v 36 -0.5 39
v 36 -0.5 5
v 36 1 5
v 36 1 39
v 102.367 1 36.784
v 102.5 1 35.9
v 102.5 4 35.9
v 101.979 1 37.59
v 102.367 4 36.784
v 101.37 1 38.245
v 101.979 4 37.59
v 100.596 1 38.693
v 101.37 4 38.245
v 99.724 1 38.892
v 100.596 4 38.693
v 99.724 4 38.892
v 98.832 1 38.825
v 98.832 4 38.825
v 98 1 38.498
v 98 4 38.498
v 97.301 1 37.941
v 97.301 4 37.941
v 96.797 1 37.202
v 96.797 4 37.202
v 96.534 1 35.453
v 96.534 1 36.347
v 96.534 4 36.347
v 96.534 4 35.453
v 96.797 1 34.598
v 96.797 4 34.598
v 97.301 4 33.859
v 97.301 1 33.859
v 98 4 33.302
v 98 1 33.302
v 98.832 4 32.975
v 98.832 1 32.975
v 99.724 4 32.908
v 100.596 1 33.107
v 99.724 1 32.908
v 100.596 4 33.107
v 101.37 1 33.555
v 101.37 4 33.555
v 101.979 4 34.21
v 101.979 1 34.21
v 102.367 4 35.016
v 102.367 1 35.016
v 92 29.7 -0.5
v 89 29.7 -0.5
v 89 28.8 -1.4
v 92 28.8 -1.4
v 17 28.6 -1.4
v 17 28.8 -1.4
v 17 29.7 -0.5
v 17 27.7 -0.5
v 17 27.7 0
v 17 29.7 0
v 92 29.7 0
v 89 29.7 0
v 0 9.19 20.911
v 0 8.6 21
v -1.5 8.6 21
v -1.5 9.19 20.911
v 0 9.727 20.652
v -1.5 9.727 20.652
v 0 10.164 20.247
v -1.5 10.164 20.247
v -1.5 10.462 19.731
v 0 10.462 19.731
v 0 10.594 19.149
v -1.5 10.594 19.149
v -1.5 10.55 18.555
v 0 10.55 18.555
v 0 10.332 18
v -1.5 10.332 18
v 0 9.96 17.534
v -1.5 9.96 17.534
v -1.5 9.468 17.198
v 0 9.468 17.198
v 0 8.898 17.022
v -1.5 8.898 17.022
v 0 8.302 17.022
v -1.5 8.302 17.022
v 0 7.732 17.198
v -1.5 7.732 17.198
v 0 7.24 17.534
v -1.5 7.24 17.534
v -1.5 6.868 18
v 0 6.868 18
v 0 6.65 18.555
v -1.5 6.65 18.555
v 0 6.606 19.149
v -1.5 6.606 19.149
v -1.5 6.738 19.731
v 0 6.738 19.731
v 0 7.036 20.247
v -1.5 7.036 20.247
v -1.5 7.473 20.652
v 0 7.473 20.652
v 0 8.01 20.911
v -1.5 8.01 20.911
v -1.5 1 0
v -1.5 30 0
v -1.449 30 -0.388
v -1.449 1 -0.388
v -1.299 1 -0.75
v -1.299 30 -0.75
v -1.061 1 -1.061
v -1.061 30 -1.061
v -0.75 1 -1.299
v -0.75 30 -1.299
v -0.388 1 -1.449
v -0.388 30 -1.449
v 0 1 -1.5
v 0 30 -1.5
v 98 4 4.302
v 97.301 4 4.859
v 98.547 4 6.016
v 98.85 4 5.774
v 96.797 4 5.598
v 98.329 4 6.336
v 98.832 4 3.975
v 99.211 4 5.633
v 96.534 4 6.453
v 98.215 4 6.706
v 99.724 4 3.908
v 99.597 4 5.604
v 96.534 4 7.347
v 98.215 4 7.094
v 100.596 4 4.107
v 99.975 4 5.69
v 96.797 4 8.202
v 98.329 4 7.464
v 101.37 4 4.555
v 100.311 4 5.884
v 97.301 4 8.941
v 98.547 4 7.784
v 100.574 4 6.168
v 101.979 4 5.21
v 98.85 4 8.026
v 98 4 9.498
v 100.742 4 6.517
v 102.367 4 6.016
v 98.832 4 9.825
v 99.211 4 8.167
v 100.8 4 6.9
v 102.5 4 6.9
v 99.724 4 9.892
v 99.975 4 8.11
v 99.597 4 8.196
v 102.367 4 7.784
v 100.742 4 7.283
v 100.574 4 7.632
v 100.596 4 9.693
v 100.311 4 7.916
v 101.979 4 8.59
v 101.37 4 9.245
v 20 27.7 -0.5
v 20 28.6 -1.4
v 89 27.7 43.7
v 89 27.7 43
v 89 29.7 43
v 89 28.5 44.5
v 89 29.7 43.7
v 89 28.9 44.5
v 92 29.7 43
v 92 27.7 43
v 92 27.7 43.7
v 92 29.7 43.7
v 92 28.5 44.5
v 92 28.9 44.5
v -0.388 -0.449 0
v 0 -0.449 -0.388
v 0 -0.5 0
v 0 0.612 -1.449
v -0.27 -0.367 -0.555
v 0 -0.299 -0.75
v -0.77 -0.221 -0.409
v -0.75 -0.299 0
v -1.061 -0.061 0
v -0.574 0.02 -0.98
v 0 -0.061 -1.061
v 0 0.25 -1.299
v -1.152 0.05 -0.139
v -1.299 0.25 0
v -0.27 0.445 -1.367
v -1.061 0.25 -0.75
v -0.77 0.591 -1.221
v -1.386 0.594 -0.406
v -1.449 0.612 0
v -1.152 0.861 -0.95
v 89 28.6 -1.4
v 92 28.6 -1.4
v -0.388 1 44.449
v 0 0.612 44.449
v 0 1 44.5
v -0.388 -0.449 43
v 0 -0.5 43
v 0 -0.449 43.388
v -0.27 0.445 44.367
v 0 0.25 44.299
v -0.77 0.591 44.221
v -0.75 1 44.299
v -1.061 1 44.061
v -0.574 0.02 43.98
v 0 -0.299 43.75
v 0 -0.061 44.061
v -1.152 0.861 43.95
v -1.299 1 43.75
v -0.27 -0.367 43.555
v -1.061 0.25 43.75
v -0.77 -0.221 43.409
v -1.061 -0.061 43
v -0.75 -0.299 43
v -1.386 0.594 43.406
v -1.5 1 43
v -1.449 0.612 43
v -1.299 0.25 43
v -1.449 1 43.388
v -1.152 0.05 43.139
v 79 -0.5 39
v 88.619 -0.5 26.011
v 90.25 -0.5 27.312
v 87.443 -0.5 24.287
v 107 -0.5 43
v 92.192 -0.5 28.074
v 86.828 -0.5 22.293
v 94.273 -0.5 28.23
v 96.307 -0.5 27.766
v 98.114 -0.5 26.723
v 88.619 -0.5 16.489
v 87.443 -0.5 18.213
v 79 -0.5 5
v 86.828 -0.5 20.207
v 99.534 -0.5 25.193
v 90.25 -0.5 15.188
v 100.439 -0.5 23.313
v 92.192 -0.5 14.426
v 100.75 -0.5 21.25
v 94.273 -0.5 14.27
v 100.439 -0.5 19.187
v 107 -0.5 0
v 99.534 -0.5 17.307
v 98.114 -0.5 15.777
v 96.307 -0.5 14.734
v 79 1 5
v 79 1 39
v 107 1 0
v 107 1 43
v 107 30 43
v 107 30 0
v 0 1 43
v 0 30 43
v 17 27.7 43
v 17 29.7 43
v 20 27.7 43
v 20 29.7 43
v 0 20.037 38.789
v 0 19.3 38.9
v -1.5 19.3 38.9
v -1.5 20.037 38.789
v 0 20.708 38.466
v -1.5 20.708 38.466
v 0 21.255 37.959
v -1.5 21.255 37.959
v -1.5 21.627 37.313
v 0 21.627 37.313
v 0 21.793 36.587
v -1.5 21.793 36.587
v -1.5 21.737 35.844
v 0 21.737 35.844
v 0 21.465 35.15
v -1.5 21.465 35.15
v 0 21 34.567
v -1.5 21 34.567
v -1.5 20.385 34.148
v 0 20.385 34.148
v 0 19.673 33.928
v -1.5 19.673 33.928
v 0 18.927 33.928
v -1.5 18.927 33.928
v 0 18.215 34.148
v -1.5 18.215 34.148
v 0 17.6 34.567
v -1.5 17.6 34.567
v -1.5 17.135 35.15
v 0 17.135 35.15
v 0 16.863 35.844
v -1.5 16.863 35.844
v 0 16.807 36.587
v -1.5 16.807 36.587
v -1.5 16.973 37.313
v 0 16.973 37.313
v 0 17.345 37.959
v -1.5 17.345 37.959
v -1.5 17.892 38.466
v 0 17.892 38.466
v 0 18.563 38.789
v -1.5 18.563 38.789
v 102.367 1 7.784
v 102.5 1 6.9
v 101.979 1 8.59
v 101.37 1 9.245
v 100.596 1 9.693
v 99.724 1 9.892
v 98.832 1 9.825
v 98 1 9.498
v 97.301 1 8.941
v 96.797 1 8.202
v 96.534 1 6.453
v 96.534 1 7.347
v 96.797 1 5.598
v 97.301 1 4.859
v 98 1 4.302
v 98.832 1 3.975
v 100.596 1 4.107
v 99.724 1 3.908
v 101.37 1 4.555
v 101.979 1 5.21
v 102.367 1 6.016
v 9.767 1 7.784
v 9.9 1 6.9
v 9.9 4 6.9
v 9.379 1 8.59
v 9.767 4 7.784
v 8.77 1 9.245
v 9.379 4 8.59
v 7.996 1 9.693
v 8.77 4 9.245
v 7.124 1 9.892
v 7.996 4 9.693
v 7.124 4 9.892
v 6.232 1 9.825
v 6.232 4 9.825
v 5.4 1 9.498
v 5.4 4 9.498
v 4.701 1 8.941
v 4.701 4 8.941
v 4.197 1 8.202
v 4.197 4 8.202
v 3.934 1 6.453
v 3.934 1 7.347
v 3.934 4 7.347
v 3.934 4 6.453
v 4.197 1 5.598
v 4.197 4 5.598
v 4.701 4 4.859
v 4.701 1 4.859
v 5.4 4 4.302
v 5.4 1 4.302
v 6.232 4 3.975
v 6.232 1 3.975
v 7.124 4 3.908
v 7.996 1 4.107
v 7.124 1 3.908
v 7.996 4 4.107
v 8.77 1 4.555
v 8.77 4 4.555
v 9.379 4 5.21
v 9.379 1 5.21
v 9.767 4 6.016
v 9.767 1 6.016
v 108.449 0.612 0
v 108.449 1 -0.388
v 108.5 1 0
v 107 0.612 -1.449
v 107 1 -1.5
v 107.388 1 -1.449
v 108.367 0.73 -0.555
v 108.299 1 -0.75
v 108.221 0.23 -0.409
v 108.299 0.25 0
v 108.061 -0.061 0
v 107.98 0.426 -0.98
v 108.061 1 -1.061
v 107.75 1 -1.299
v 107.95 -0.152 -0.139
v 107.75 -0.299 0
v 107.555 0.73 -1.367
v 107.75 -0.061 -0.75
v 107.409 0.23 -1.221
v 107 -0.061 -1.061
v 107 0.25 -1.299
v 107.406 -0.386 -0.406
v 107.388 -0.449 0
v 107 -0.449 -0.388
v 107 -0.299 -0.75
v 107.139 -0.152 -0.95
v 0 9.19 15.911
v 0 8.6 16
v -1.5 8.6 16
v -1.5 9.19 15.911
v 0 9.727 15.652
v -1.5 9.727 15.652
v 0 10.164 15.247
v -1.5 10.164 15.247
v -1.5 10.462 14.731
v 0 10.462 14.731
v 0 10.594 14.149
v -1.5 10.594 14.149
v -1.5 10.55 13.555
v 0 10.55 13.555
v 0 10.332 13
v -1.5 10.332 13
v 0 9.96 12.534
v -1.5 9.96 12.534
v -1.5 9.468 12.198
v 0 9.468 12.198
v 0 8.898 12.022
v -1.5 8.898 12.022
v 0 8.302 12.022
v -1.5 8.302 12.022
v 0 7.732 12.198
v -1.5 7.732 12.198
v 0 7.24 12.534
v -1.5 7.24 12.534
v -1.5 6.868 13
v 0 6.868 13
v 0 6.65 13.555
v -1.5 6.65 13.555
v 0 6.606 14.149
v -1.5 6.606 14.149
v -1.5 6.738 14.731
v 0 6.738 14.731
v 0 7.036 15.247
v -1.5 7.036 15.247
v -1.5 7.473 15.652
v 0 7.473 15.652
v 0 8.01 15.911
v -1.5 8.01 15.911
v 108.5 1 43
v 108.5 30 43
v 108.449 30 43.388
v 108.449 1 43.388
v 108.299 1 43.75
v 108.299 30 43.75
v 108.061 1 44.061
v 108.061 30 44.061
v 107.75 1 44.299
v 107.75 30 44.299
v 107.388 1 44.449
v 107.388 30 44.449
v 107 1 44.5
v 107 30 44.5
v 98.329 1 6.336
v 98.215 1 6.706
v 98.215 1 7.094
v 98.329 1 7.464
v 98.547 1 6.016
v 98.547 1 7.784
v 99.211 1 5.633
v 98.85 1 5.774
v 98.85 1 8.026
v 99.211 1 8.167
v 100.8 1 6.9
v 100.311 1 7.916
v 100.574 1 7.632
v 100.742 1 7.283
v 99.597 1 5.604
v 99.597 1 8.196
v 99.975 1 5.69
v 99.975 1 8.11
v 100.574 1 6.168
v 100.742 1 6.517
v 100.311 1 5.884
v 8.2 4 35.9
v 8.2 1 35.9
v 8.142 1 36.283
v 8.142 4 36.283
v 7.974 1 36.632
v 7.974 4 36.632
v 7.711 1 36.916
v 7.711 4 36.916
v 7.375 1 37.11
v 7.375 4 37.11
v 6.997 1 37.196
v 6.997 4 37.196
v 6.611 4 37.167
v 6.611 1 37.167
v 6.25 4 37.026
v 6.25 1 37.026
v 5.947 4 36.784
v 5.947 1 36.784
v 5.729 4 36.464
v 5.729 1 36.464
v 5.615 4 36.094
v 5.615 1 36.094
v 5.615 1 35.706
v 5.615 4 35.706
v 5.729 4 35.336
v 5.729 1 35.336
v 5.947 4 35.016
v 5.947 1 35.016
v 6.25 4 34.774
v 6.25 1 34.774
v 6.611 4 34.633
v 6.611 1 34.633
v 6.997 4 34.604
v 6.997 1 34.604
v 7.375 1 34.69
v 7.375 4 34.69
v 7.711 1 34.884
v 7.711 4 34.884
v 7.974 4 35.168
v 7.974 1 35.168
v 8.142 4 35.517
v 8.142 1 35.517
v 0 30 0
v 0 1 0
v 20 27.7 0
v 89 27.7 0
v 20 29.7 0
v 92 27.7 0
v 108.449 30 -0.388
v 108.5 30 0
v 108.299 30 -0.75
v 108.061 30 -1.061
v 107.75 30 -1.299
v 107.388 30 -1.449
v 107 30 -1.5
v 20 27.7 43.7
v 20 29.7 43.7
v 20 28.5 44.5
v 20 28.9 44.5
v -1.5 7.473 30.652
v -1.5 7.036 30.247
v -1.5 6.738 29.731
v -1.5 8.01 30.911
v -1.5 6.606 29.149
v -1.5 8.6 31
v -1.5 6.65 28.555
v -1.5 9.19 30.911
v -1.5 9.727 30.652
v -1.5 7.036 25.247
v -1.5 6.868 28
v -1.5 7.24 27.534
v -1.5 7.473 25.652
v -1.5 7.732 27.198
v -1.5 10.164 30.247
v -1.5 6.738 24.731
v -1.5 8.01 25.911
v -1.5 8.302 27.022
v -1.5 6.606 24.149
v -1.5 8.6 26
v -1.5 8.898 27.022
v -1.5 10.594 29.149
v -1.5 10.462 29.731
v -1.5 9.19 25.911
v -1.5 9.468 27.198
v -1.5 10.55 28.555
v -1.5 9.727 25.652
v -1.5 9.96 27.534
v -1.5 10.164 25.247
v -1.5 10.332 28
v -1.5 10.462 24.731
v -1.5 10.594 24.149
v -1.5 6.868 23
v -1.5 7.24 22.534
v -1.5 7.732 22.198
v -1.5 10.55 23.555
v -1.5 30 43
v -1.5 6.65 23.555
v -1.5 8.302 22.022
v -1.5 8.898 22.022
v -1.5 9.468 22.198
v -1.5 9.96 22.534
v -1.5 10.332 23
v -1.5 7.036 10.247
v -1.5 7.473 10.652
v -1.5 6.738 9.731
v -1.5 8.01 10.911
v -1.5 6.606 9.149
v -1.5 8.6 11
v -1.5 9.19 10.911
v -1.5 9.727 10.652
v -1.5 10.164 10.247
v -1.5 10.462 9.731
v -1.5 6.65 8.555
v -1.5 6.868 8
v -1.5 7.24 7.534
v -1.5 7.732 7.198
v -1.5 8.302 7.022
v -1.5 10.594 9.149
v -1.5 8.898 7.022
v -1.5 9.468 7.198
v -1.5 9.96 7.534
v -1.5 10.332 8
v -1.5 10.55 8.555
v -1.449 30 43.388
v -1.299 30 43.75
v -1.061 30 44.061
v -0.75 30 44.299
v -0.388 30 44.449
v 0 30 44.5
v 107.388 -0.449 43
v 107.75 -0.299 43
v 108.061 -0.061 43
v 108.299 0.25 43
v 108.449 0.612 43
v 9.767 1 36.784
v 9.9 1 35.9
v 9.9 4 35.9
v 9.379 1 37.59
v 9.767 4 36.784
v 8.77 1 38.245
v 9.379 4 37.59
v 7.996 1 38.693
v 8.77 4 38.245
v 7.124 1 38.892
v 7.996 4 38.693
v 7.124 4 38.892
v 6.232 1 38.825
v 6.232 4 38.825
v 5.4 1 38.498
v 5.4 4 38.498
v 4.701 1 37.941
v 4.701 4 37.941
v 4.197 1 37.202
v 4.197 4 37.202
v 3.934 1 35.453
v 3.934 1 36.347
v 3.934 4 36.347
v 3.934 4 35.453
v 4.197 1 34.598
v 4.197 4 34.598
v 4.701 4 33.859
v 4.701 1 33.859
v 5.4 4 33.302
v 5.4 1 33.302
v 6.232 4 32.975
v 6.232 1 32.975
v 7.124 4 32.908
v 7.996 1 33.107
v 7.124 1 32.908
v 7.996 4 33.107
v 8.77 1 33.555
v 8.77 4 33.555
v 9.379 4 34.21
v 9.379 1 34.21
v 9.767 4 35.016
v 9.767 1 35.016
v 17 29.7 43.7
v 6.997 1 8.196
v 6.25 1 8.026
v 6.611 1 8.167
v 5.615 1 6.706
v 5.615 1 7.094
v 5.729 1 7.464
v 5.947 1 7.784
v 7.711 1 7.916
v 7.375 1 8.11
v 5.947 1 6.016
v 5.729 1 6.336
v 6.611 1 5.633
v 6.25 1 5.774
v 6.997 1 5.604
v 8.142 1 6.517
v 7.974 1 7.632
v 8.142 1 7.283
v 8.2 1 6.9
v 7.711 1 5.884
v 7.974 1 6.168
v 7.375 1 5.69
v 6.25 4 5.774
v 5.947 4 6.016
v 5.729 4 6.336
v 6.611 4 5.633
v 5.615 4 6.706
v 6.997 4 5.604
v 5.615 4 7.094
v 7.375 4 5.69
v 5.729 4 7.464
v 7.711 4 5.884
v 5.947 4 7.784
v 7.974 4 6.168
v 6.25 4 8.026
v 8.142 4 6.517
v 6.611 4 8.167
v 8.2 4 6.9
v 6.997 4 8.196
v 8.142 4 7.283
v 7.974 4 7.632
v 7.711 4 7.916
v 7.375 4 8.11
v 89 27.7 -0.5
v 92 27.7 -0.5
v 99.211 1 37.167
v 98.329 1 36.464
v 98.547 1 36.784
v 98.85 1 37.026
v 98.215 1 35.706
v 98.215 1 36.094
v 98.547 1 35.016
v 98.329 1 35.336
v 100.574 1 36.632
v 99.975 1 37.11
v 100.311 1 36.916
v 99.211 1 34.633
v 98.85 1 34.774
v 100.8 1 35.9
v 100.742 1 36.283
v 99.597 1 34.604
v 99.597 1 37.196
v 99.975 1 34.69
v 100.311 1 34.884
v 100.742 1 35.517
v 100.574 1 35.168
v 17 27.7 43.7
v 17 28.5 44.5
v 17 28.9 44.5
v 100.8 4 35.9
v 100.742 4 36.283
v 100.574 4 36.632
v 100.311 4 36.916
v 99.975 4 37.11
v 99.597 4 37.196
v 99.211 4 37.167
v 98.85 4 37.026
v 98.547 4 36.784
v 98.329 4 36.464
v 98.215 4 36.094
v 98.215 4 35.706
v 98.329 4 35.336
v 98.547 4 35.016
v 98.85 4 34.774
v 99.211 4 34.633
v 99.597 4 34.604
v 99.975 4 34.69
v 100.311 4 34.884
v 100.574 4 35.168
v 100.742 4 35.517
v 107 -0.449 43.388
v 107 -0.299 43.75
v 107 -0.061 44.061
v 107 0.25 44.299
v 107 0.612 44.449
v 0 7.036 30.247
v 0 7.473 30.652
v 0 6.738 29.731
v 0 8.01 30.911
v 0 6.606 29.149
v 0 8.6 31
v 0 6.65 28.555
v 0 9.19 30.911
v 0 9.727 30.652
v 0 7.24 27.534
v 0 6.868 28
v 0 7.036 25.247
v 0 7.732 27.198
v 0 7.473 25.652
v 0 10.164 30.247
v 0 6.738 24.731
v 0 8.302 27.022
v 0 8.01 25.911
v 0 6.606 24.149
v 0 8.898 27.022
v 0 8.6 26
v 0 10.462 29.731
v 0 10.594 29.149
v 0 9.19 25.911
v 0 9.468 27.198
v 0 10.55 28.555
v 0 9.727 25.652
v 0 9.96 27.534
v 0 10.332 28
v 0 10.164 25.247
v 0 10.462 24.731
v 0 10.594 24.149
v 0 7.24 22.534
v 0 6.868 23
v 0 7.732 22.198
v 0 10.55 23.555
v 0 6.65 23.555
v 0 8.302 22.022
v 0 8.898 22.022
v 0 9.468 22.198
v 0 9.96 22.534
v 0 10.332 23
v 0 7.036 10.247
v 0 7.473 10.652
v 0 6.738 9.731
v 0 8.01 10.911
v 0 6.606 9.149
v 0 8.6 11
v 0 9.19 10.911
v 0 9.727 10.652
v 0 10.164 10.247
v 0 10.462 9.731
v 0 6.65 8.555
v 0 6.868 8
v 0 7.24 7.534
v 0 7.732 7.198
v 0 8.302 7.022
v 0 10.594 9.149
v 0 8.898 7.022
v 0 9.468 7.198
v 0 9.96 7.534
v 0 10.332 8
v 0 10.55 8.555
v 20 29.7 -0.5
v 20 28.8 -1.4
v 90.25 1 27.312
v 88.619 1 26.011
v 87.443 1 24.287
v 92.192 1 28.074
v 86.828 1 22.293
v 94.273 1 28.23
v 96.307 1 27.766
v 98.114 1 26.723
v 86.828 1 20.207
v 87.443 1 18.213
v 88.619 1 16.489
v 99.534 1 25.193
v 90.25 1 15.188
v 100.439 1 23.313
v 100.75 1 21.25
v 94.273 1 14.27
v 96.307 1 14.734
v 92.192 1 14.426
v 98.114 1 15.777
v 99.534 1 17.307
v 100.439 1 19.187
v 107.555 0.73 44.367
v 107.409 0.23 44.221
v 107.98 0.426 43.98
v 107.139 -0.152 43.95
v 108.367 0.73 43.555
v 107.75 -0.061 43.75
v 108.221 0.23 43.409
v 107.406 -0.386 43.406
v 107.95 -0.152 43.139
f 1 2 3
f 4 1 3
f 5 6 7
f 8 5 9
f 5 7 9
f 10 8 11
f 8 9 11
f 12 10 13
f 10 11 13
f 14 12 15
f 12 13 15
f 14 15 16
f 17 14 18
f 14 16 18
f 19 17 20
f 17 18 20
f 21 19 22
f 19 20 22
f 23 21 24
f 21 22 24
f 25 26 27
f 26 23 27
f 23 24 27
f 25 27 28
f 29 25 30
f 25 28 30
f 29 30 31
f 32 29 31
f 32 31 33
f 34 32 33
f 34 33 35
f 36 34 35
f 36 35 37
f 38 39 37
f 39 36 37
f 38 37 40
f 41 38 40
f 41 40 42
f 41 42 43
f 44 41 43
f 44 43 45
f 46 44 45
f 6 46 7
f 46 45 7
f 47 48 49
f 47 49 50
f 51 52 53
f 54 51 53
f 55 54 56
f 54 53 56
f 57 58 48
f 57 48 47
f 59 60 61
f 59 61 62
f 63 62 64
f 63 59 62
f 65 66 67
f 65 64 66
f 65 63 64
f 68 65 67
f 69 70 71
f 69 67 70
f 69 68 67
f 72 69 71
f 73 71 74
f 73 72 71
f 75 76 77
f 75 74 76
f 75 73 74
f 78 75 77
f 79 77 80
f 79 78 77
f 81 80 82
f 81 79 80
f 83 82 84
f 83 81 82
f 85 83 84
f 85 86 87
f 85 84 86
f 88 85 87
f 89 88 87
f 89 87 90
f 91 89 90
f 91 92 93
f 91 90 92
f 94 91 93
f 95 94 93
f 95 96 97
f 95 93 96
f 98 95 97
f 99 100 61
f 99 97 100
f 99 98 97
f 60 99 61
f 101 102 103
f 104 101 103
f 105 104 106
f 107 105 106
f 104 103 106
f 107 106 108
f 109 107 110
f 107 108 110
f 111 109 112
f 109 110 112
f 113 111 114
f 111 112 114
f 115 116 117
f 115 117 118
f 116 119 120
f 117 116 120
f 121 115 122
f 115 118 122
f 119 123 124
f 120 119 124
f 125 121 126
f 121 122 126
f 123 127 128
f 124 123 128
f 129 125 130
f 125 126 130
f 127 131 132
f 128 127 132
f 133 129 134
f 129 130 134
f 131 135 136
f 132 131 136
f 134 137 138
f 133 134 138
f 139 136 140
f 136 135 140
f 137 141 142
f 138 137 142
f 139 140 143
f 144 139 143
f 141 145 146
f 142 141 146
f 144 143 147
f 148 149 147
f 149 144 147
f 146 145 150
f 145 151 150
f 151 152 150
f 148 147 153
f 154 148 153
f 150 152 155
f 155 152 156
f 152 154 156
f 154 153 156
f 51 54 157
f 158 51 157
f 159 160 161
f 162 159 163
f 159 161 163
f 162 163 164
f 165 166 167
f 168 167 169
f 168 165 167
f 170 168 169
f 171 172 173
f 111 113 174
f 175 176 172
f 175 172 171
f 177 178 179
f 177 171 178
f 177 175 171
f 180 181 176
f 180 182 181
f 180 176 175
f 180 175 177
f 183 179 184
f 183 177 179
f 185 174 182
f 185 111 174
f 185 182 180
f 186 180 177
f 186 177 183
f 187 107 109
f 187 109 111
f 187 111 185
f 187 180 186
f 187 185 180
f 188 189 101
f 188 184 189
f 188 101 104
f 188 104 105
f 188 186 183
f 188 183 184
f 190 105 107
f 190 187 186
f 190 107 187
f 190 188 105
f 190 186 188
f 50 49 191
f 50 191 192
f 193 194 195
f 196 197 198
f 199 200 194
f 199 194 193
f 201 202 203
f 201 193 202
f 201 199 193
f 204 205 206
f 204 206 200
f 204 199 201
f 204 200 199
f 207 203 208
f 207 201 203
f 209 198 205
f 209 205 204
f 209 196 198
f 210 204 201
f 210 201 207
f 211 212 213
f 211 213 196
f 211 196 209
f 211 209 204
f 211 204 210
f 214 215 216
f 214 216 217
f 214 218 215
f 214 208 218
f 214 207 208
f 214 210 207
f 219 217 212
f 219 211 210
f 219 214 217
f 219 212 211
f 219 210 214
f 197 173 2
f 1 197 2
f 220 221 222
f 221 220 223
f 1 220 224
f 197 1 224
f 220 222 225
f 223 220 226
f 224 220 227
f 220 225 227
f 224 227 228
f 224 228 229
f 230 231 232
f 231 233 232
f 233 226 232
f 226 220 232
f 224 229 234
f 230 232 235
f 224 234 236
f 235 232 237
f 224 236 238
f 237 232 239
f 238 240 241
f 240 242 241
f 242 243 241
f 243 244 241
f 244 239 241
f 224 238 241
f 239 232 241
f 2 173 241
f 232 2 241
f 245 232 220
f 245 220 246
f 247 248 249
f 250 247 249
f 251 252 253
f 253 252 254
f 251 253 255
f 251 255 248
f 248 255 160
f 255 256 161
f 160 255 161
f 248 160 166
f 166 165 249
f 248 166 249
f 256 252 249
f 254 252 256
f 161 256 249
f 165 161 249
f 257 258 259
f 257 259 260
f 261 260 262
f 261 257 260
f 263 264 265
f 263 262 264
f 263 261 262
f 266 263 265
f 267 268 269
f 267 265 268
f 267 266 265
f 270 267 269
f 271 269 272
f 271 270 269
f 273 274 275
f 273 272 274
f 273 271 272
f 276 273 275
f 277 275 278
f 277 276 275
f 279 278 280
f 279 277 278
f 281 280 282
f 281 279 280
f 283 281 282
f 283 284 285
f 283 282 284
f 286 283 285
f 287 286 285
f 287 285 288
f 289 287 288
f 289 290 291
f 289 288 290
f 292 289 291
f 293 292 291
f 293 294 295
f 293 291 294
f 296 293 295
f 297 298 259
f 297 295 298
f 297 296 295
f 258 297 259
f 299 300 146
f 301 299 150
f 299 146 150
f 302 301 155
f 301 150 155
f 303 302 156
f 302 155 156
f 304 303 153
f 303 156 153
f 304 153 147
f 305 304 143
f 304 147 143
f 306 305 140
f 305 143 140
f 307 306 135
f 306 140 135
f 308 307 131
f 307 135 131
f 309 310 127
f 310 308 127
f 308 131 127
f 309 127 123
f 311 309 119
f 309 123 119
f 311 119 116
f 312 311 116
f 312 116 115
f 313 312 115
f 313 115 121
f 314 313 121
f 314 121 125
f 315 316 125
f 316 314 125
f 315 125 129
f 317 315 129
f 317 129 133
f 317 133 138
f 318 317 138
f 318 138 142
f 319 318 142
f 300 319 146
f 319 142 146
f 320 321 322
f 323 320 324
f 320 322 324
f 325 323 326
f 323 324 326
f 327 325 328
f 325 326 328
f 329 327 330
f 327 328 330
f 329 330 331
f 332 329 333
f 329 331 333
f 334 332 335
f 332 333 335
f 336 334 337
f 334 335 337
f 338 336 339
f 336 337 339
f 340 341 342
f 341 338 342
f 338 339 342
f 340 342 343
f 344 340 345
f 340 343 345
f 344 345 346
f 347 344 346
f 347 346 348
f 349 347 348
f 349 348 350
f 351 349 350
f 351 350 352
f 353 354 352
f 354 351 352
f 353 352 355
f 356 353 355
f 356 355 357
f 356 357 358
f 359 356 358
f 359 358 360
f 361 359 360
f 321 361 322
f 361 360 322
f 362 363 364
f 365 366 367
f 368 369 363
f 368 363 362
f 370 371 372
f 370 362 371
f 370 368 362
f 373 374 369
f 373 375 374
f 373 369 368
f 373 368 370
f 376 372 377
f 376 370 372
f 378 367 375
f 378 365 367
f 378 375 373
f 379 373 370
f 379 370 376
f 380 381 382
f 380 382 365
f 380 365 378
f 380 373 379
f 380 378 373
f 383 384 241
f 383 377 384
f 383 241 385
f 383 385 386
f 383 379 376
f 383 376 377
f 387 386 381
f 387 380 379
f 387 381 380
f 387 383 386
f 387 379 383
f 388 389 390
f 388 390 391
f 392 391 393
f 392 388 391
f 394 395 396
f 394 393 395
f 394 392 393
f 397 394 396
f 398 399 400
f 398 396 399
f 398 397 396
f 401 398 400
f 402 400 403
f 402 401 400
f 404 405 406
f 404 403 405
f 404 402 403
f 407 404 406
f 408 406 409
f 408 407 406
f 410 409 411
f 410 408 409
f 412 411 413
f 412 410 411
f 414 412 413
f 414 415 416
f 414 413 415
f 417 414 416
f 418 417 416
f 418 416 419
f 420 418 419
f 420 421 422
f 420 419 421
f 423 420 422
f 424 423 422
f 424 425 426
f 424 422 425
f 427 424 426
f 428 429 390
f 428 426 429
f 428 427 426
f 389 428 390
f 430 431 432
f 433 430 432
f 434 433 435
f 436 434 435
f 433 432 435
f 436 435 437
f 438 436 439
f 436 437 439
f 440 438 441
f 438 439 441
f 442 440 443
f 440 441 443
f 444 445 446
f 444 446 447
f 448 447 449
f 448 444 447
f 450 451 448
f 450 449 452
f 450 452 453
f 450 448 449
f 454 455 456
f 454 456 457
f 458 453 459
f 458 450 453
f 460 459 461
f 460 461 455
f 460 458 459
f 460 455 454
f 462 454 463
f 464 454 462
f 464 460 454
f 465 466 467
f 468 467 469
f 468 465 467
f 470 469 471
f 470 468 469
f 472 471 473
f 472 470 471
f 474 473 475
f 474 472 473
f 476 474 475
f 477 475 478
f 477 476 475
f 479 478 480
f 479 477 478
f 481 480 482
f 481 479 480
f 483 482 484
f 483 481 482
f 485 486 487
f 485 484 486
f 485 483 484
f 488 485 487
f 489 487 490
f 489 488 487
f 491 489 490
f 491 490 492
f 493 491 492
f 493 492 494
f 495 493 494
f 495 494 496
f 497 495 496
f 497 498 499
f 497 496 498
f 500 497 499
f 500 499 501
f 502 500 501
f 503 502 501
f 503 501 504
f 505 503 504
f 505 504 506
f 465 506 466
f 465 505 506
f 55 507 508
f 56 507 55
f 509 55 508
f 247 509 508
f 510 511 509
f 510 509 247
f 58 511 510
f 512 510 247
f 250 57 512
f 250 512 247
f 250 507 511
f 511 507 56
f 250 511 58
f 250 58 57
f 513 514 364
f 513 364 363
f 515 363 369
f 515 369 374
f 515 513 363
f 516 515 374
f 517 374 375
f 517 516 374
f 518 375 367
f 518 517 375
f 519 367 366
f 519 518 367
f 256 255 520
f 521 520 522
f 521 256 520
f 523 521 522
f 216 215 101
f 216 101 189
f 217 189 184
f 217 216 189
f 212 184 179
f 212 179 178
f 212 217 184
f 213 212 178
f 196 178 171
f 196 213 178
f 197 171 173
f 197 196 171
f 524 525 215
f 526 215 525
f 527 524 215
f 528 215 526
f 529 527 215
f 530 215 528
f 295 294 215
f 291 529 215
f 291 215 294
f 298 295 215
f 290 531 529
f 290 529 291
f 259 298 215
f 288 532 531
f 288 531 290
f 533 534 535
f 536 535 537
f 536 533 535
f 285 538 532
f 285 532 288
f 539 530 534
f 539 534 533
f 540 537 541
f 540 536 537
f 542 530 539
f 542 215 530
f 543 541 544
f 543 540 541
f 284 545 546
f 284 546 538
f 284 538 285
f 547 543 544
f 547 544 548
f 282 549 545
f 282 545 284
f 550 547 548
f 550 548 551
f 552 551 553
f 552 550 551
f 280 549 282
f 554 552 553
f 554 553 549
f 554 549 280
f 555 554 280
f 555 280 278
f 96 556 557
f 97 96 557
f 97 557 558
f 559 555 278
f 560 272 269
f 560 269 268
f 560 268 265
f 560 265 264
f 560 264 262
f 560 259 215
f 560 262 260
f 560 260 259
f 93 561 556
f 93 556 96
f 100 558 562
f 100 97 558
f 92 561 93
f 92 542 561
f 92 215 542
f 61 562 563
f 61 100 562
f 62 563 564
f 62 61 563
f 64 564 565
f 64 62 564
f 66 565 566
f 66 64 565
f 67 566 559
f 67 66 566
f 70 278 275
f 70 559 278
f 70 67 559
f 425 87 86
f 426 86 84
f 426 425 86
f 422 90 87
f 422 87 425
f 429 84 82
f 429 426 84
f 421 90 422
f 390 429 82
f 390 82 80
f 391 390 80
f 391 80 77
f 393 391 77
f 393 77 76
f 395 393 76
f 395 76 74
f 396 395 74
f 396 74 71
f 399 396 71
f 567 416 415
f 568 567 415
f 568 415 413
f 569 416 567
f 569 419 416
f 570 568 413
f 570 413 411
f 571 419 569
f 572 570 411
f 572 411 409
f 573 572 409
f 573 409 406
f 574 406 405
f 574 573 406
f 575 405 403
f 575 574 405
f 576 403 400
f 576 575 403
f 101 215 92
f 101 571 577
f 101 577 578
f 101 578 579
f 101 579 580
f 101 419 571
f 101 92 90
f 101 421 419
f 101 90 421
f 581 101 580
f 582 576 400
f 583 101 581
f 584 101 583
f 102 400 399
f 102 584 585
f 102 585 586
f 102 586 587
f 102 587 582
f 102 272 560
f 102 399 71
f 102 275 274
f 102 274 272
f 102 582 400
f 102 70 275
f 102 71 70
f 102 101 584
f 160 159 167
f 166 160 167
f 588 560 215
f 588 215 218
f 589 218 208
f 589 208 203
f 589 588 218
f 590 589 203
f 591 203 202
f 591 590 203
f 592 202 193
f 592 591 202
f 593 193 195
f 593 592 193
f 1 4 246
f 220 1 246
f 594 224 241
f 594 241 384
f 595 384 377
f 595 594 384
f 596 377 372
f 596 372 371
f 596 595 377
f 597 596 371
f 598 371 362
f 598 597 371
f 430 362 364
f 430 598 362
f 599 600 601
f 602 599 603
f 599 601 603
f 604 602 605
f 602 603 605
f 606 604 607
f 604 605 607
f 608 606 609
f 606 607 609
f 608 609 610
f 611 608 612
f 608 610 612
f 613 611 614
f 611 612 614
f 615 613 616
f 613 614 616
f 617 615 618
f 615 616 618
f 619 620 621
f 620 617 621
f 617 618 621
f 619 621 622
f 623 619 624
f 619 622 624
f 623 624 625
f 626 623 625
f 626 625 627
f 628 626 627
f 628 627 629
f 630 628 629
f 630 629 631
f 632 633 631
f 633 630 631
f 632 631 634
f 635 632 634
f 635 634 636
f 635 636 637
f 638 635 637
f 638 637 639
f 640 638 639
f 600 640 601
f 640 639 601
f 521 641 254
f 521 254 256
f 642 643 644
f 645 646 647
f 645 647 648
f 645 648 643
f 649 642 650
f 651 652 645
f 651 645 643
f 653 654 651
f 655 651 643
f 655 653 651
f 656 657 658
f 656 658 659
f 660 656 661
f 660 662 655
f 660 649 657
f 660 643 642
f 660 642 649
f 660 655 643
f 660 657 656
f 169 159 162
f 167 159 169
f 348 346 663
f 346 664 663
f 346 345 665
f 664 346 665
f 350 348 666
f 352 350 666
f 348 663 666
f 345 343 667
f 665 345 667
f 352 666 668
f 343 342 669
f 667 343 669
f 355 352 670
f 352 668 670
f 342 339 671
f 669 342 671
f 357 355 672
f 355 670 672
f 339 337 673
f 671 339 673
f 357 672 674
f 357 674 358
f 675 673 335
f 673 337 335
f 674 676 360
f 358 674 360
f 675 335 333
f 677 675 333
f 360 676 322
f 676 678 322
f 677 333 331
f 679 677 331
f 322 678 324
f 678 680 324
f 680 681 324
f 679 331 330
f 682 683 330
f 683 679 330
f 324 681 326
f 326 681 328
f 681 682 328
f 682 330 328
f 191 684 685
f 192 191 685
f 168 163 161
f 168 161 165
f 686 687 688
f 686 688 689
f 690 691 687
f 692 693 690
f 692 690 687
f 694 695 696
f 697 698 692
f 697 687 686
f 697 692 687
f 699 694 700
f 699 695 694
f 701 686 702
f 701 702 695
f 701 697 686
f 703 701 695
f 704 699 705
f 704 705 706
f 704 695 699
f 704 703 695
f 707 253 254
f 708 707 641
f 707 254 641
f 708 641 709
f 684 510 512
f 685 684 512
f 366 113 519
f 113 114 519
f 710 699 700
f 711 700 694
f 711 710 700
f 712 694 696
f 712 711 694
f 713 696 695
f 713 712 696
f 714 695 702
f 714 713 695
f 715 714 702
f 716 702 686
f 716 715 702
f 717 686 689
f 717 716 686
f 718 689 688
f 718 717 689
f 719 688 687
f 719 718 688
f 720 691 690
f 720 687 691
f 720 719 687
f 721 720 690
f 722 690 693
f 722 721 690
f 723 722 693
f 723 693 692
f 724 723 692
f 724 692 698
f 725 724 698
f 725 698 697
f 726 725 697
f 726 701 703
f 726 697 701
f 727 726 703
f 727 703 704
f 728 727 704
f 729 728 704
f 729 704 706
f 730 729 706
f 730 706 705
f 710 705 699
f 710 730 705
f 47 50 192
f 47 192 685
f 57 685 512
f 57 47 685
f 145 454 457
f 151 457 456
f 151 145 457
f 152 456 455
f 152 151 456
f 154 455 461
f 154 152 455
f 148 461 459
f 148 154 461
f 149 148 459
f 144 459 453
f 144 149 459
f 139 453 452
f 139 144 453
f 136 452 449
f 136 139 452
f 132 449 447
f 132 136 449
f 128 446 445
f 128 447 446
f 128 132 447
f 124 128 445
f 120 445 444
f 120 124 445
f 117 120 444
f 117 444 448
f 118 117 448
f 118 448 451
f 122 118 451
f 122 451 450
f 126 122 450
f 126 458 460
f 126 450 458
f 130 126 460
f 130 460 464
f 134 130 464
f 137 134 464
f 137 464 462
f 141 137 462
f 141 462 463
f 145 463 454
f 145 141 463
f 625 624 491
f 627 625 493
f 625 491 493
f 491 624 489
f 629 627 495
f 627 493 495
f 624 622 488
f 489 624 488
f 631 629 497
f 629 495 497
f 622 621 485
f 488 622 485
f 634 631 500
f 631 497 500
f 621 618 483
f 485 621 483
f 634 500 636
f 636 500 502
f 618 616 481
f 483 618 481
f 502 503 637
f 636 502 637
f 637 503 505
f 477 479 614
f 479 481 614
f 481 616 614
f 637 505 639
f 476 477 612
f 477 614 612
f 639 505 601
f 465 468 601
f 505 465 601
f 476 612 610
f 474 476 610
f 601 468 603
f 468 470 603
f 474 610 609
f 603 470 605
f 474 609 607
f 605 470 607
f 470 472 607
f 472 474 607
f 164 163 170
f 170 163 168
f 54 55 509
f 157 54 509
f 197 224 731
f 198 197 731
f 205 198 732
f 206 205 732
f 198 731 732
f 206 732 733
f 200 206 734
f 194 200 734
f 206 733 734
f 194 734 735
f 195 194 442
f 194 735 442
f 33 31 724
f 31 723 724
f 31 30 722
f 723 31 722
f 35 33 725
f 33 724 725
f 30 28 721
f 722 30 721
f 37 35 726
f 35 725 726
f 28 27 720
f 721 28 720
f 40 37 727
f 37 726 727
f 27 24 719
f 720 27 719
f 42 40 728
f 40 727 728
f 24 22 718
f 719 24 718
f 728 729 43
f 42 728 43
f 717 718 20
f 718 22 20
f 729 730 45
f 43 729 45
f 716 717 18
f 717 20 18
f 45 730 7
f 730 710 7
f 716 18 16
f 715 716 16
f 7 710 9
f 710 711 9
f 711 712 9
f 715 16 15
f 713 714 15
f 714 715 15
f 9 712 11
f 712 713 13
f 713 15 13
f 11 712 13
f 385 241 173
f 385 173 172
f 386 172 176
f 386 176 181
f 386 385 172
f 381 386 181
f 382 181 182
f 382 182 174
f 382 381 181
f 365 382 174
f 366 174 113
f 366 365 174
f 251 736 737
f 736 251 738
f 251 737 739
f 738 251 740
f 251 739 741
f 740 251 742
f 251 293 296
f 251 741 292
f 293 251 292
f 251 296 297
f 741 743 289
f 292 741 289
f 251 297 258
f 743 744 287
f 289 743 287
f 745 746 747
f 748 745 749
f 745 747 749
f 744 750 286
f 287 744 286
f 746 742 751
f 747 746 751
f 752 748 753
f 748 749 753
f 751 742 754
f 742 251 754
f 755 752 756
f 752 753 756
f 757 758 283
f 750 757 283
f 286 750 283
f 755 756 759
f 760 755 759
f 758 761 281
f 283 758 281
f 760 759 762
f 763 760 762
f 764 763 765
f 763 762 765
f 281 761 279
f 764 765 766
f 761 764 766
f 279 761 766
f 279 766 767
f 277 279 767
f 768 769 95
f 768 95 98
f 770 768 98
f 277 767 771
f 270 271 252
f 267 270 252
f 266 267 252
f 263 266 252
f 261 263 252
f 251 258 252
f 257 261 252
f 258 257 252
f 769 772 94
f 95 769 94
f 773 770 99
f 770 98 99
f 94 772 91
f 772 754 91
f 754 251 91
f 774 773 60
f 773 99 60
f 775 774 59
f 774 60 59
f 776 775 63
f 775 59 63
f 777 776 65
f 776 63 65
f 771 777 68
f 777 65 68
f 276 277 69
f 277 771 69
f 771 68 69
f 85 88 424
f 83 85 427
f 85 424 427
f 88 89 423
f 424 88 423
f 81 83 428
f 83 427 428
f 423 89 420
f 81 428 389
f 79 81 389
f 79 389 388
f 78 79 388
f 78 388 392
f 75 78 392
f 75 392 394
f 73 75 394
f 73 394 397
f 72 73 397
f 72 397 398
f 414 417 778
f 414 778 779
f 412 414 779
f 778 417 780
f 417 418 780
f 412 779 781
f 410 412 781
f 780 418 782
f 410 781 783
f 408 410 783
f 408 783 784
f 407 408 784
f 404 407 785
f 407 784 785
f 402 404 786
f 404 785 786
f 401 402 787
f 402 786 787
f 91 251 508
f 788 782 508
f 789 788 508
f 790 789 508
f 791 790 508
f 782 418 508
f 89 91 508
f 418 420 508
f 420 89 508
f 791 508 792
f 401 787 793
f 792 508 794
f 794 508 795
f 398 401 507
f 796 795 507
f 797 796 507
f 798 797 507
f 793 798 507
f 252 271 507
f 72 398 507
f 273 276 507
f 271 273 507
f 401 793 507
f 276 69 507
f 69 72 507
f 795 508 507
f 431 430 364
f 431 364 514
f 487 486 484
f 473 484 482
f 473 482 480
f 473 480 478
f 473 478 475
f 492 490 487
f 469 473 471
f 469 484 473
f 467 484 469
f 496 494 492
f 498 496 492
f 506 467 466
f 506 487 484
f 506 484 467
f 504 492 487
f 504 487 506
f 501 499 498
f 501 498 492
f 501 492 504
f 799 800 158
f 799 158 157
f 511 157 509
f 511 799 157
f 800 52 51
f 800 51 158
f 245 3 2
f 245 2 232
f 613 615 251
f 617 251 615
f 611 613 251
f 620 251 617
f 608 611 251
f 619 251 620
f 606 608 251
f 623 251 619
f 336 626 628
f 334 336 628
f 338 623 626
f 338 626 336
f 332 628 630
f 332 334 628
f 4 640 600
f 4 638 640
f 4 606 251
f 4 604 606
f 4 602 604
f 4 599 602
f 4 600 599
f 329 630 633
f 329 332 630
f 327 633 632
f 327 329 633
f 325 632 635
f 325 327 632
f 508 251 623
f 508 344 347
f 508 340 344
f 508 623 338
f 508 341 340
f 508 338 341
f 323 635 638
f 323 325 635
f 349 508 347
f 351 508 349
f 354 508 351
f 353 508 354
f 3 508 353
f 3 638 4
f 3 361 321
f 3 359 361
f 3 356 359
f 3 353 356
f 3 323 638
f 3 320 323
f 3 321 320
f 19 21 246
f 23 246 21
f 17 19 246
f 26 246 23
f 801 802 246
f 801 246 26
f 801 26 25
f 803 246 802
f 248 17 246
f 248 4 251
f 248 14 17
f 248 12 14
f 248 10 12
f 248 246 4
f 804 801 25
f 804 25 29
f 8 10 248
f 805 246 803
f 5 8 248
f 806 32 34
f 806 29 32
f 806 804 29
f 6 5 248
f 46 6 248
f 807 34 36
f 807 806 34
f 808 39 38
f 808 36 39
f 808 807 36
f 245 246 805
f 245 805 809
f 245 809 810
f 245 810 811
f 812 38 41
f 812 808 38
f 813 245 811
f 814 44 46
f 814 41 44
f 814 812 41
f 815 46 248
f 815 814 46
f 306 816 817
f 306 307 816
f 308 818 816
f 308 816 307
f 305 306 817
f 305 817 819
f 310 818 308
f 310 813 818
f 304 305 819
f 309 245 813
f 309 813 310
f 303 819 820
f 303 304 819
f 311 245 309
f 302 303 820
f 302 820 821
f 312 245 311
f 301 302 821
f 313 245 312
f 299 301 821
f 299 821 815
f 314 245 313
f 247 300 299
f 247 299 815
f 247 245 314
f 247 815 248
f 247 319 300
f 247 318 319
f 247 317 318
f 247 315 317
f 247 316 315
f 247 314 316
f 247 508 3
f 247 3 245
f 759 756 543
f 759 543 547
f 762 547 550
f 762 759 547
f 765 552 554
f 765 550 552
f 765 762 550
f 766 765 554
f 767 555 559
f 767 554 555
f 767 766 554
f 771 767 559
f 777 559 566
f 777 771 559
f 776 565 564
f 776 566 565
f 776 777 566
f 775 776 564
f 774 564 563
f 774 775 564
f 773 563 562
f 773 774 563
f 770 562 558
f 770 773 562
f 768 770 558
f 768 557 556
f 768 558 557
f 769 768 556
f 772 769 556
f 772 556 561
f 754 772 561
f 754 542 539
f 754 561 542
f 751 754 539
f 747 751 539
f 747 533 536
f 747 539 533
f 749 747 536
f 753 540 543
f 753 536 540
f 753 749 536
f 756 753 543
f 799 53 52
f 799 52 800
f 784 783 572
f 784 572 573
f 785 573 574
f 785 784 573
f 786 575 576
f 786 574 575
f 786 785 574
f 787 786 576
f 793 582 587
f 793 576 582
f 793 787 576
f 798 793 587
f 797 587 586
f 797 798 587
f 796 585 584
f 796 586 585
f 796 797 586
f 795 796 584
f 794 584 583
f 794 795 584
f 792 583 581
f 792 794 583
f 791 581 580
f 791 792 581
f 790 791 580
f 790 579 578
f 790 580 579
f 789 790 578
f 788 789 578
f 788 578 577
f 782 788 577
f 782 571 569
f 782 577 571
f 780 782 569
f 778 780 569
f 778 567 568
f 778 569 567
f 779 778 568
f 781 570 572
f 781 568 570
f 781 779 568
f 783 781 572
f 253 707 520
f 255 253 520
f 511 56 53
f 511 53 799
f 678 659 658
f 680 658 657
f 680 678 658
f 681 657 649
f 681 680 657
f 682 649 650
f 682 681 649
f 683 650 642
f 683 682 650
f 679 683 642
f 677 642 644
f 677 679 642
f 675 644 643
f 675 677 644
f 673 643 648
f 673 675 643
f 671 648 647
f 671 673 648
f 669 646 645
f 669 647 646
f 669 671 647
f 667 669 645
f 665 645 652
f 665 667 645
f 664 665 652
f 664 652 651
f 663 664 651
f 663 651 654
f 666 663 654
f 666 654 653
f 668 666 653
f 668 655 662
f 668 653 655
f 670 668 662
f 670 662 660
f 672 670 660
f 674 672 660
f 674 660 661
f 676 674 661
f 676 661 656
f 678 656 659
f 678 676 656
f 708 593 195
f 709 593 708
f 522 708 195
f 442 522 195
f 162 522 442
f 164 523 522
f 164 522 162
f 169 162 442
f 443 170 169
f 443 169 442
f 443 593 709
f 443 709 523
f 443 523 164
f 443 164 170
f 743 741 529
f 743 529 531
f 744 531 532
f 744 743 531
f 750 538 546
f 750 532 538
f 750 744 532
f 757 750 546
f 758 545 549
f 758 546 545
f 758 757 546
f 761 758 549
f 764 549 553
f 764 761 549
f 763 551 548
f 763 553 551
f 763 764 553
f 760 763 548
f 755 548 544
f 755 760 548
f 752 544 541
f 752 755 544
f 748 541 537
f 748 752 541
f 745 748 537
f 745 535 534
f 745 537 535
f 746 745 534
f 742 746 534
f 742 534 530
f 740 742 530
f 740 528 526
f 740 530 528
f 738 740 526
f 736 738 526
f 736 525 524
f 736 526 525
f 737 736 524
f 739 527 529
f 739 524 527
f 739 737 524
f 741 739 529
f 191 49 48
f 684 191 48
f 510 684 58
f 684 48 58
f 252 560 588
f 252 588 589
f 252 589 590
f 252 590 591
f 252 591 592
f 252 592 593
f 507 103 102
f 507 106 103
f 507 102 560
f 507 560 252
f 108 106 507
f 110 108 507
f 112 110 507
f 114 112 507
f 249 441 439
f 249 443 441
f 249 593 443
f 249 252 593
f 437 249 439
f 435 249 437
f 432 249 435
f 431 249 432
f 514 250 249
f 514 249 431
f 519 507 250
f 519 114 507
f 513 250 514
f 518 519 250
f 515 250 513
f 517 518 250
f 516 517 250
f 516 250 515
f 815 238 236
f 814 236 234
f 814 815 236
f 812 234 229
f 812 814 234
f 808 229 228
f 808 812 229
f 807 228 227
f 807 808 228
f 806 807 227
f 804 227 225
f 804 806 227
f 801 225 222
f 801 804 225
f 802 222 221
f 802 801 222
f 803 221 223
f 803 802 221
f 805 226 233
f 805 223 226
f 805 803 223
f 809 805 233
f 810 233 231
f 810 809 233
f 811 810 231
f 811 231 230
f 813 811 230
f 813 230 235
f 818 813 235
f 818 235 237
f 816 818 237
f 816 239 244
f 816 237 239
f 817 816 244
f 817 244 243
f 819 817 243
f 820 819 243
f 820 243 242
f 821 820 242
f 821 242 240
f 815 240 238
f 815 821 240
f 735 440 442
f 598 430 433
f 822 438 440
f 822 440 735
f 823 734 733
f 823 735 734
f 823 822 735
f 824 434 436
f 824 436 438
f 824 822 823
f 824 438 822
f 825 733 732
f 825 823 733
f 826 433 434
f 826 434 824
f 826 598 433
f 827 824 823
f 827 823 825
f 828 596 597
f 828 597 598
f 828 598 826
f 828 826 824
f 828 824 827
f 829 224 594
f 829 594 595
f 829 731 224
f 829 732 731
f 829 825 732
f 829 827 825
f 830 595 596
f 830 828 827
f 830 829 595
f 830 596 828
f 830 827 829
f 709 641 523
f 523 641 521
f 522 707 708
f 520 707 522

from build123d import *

# Parameters (mm, degrees)
TUBE001_R                  = 3
TUBE001_R_2                = 1.3
TUBE001_DEPTH              = 4
TUBE002_R                  = 3
TUBE002_R_2                = 1.3
TUBE002_DEPTH              = 4
TUBE003_R                  = 3
TUBE003_R_2                = 1.3
TUBE003_DEPTH              = 4
TUBE_R                     = 3
TUBE_R_2                   = 1.3
TUBE_DEPTH                 = 4
CYLINDER007_R              = 2
CYLINDER007_DEPTH          = 10
CYLINDER008_R              = 2
CYLINDER008_DEPTH          = 10
CYLINDER009_R              = 2
CYLINDER009_DEPTH          = 10
CYLINDER010_R              = 2
CYLINDER010_DEPTH          = 10
CYLINDER006_R              = 2
CYLINDER006_DEPTH          = 10
BOX026_W                   = 3
BOX026_H                   = 46
BOX026_DEPTH               = 2
CHAMFER001_SIZE            = 0.9
CHAMFER001_PLACEMENT_ANGLE = 90
BOX025_W                   = 3
BOX025_H                   = 46
BOX025_DEPTH               = 2
CHAMFER_SIZE               = 0.9
CHAMFER_PLACEMENT_ANGLE    = 90
CYLINDER005_R              = 2.5
CYLINDER005_DEPTH          = 10
CYLINDER001_R              = 7
CYLINDER001_DEPTH          = 10
BOX001_W                   = 43
BOX001_H                   = 10
BOX001_DEPTH               = 34
BOX_W                      = 107
BOX_H                      = 29
BOX_DEPTH                  = 43
THICKNESS_T                = 1.5


with BuildPart() as tube001:
    # Tube001 → Tube001 (new body)
    with BuildSketch(Plane(origin=(6.9, 4, 35.9), x_dir=(1, 0, 0), z_dir=(0, -1, 0))):
        Circle(TUBE001_R)
        Circle(TUBE001_R_2, mode=Mode.SUBTRACT)
    extrude(amount=TUBE001_DEPTH)


with BuildPart() as tube002:
    # Tube002 → Tube002 (new body)
    with BuildSketch(Plane(origin=(99.5, 4, 6.9), x_dir=(1, 0, 0), z_dir=(0, -1, 0))):
        Circle(TUBE002_R)
        Circle(TUBE002_R_2, mode=Mode.SUBTRACT)
    extrude(amount=TUBE002_DEPTH)


with BuildPart() as tube003:
    # Tube003 → Tube003 (new body)
    with BuildSketch(Plane(origin=(99.5, 4, 35.9), x_dir=(1, 0, 0), z_dir=(0, -1, 0))):
        Circle(TUBE003_R)
        Circle(TUBE003_R_2, mode=Mode.SUBTRACT)
    extrude(amount=TUBE003_DEPTH)


with BuildPart() as fusion005:
    # Tube → Tube (new body)
    with BuildSketch(Plane(origin=(6.9, 4, 6.9), x_dir=(1, 0, 0), z_dir=(0, -1, 0))):
        Circle(TUBE_R)
        Circle(TUBE_R_2, mode=Mode.SUBTRACT)
    extrude(amount=TUBE_DEPTH)

    # Fusion005: union Tube001, Tube002, Tube003
    add(tube001.part)
    add(tube002.part)
    add(tube003.part)


with BuildPart() as cilindro007:
    # Cylinder007 → Cylinder007 (new body)
    with BuildSketch(Plane(origin=(5.4, 8.6, 24), x_dir=(0, 0, 1), z_dir=(-1, 0, 0))):
        Circle(CYLINDER007_R)
    extrude(amount=CYLINDER007_DEPTH)


with BuildPart() as cilindro008:
    # Cylinder008 → Cylinder008 (new body)
    with BuildSketch(Plane(origin=(5.4, 8.6, 19), x_dir=(0, 0, 1), z_dir=(-1, 0, 0))):
        Circle(CYLINDER008_R)
    extrude(amount=CYLINDER008_DEPTH)


with BuildPart() as cilindro009:
    # Cylinder009 → Cylinder009 (new body)
    with BuildSketch(Plane(origin=(5.4, 8.6, 14), x_dir=(0, 0, 1), z_dir=(-1, 0, 0))):
        Circle(CYLINDER009_R)
    extrude(amount=CYLINDER009_DEPTH)


with BuildPart() as cilindro010:
    # Cylinder010 → Cylinder010 (new body)
    with BuildSketch(Plane(origin=(5.4, 8.6, 9), x_dir=(0, 0, 1), z_dir=(-1, 0, 0))):
        Circle(CYLINDER010_R)
    extrude(amount=CYLINDER010_DEPTH)


with BuildPart() as fusion004:
    # Cylinder006 → Cylinder006 (new body)
    with BuildSketch(Plane(origin=(5.4, 8.6, 29), x_dir=(0, 0, 1), z_dir=(-1, 0, 0))):
        Circle(CYLINDER006_R)
    extrude(amount=CYLINDER006_DEPTH)

    # Fusion004: union Cilindro007, Cilindro008, Cilindro009, Cilindro010
    add(cilindro007.part)
    add(cilindro008.part)
    add(cilindro009.part)
    add(cilindro010.part)


with BuildPart() as chamfer001:
    # Box026 → Box026 (new body)
    with BuildSketch(Plane(origin=(5, -1, -6), x_dir=(1, 0, 0), z_dir=(0, 0, 1))):
        with Locations((1.5, 23)):
            Rectangle(BOX026_W, BOX026_H)
    extrude(amount=BOX026_DEPTH)

    # Chamfer001
    chamfer001_edges = [chamfer001.edges().sort_by_distance(p)[0] for p in [
        (6.5, -1, -6),
        (6.5, -1, -4),
        (6.5, 45, -6),
        (6.5, 45, -4),
    ]]
    chamfer(chamfer001_edges, length=CHAMFER001_SIZE)


with BuildPart() as chamfer001_1:
    # Chamfer001 placement: moved
    add(chamfer001.part.moved(Location((84, 23.7, -0.4))).rotate(Axis((84, 23.7, -0.4), (1, 0, 0)), CHAMFER001_PLACEMENT_ANGLE))


with BuildPart() as fusion:
    # Box025 → Box025 (new body)
    with BuildSketch(Plane(origin=(5, -1, -6), x_dir=(1, 0, 0), z_dir=(0, 0, 1))):
        with Locations((1.5, 23)):
            Rectangle(BOX025_W, BOX025_H)
    extrude(amount=BOX025_DEPTH)

    # Chamfer
    chamfer_edges = [fusion.edges().sort_by_distance(p)[0] for p in [
        (6.5, -1, -6),
        (6.5, -1, -4),
        (6.5, 45, -6),
        (6.5, 45, -4),
    ]]
    chamfer(chamfer_edges, length=CHAMFER_SIZE)


with BuildPart() as fusion_1:
    # Chamfer placement: moved
    add(fusion.part.moved(Location((12, 23.7, -0.4))).rotate(Axis((12, 23.7, -0.4), (1, 0, 0)), CHAMFER_PLACEMENT_ANGLE))

    # Fusion: union Chamfer001
    add(chamfer001_1.part)


with BuildPart() as cilindro005:
    # Cylinder005 → Cylinder005 (new body)
    with BuildSketch(Plane(origin=(3, 19.3, 36.4), x_dir=(0, 0, 1), z_dir=(-1, 0, 0))):
        Circle(CYLINDER005_R)
    extrude(amount=CYLINDER005_DEPTH)


with BuildPart() as cilindro001:
    # Cylinder001 → Cylinder001 (new body)
    with BuildSketch(Plane(origin=(93.75, 1, 21.25), x_dir=(1, 0, 0), z_dir=(0, -1, 0))):
        Circle(CYLINDER001_R)
    extrude(amount=CYLINDER001_DEPTH)


with BuildPart() as cubo001:
    # Box001 → Box001 (new body)
    with BuildSketch(Plane(origin=(36, -1, 5), x_dir=(1, 0, 0), z_dir=(0, 0, 1))):
        with Locations((21.5, 5)):
            Rectangle(BOX001_W, BOX001_H)
    extrude(amount=BOX001_DEPTH)


with BuildPart() as caixa:
    # Box → Box (new body)
    with BuildSketch(Plane.XY):
        with Locations((53.5, 14.5)):
            Rectangle(BOX_W, BOX_H)
    extrude(amount=BOX_DEPTH)

    # Thickness
    thickness_openings = [caixa.faces().sort_by_distance(p)[0] for p in [
        (53.5, 29, 21.5),
    ]]
    offset(amount=THICKNESS_T, openings=thickness_openings)


with BuildPart() as caixa_1:
    # Thickness placement: moved
    add(caixa.part.moved(Location((0, 1, 0))))

    # Cut: cut Cubo001
    add(cubo001.part, mode=Mode.SUBTRACT)

    # Cut001: cut Cilindro001
    add(cilindro001.part, mode=Mode.SUBTRACT)

    # Cut002: cut Cilindro005
    add(cilindro005.part, mode=Mode.SUBTRACT)

    # Cut003: cut Fusion
    add(fusion_1.part, mode=Mode.SUBTRACT)

    # Cut005: cut Fusion004
    add(fusion004.part, mode=Mode.SUBTRACT)

    # Fusion006: union Fusion005
    add(fusion005.part)


solid = caixa_1.part
